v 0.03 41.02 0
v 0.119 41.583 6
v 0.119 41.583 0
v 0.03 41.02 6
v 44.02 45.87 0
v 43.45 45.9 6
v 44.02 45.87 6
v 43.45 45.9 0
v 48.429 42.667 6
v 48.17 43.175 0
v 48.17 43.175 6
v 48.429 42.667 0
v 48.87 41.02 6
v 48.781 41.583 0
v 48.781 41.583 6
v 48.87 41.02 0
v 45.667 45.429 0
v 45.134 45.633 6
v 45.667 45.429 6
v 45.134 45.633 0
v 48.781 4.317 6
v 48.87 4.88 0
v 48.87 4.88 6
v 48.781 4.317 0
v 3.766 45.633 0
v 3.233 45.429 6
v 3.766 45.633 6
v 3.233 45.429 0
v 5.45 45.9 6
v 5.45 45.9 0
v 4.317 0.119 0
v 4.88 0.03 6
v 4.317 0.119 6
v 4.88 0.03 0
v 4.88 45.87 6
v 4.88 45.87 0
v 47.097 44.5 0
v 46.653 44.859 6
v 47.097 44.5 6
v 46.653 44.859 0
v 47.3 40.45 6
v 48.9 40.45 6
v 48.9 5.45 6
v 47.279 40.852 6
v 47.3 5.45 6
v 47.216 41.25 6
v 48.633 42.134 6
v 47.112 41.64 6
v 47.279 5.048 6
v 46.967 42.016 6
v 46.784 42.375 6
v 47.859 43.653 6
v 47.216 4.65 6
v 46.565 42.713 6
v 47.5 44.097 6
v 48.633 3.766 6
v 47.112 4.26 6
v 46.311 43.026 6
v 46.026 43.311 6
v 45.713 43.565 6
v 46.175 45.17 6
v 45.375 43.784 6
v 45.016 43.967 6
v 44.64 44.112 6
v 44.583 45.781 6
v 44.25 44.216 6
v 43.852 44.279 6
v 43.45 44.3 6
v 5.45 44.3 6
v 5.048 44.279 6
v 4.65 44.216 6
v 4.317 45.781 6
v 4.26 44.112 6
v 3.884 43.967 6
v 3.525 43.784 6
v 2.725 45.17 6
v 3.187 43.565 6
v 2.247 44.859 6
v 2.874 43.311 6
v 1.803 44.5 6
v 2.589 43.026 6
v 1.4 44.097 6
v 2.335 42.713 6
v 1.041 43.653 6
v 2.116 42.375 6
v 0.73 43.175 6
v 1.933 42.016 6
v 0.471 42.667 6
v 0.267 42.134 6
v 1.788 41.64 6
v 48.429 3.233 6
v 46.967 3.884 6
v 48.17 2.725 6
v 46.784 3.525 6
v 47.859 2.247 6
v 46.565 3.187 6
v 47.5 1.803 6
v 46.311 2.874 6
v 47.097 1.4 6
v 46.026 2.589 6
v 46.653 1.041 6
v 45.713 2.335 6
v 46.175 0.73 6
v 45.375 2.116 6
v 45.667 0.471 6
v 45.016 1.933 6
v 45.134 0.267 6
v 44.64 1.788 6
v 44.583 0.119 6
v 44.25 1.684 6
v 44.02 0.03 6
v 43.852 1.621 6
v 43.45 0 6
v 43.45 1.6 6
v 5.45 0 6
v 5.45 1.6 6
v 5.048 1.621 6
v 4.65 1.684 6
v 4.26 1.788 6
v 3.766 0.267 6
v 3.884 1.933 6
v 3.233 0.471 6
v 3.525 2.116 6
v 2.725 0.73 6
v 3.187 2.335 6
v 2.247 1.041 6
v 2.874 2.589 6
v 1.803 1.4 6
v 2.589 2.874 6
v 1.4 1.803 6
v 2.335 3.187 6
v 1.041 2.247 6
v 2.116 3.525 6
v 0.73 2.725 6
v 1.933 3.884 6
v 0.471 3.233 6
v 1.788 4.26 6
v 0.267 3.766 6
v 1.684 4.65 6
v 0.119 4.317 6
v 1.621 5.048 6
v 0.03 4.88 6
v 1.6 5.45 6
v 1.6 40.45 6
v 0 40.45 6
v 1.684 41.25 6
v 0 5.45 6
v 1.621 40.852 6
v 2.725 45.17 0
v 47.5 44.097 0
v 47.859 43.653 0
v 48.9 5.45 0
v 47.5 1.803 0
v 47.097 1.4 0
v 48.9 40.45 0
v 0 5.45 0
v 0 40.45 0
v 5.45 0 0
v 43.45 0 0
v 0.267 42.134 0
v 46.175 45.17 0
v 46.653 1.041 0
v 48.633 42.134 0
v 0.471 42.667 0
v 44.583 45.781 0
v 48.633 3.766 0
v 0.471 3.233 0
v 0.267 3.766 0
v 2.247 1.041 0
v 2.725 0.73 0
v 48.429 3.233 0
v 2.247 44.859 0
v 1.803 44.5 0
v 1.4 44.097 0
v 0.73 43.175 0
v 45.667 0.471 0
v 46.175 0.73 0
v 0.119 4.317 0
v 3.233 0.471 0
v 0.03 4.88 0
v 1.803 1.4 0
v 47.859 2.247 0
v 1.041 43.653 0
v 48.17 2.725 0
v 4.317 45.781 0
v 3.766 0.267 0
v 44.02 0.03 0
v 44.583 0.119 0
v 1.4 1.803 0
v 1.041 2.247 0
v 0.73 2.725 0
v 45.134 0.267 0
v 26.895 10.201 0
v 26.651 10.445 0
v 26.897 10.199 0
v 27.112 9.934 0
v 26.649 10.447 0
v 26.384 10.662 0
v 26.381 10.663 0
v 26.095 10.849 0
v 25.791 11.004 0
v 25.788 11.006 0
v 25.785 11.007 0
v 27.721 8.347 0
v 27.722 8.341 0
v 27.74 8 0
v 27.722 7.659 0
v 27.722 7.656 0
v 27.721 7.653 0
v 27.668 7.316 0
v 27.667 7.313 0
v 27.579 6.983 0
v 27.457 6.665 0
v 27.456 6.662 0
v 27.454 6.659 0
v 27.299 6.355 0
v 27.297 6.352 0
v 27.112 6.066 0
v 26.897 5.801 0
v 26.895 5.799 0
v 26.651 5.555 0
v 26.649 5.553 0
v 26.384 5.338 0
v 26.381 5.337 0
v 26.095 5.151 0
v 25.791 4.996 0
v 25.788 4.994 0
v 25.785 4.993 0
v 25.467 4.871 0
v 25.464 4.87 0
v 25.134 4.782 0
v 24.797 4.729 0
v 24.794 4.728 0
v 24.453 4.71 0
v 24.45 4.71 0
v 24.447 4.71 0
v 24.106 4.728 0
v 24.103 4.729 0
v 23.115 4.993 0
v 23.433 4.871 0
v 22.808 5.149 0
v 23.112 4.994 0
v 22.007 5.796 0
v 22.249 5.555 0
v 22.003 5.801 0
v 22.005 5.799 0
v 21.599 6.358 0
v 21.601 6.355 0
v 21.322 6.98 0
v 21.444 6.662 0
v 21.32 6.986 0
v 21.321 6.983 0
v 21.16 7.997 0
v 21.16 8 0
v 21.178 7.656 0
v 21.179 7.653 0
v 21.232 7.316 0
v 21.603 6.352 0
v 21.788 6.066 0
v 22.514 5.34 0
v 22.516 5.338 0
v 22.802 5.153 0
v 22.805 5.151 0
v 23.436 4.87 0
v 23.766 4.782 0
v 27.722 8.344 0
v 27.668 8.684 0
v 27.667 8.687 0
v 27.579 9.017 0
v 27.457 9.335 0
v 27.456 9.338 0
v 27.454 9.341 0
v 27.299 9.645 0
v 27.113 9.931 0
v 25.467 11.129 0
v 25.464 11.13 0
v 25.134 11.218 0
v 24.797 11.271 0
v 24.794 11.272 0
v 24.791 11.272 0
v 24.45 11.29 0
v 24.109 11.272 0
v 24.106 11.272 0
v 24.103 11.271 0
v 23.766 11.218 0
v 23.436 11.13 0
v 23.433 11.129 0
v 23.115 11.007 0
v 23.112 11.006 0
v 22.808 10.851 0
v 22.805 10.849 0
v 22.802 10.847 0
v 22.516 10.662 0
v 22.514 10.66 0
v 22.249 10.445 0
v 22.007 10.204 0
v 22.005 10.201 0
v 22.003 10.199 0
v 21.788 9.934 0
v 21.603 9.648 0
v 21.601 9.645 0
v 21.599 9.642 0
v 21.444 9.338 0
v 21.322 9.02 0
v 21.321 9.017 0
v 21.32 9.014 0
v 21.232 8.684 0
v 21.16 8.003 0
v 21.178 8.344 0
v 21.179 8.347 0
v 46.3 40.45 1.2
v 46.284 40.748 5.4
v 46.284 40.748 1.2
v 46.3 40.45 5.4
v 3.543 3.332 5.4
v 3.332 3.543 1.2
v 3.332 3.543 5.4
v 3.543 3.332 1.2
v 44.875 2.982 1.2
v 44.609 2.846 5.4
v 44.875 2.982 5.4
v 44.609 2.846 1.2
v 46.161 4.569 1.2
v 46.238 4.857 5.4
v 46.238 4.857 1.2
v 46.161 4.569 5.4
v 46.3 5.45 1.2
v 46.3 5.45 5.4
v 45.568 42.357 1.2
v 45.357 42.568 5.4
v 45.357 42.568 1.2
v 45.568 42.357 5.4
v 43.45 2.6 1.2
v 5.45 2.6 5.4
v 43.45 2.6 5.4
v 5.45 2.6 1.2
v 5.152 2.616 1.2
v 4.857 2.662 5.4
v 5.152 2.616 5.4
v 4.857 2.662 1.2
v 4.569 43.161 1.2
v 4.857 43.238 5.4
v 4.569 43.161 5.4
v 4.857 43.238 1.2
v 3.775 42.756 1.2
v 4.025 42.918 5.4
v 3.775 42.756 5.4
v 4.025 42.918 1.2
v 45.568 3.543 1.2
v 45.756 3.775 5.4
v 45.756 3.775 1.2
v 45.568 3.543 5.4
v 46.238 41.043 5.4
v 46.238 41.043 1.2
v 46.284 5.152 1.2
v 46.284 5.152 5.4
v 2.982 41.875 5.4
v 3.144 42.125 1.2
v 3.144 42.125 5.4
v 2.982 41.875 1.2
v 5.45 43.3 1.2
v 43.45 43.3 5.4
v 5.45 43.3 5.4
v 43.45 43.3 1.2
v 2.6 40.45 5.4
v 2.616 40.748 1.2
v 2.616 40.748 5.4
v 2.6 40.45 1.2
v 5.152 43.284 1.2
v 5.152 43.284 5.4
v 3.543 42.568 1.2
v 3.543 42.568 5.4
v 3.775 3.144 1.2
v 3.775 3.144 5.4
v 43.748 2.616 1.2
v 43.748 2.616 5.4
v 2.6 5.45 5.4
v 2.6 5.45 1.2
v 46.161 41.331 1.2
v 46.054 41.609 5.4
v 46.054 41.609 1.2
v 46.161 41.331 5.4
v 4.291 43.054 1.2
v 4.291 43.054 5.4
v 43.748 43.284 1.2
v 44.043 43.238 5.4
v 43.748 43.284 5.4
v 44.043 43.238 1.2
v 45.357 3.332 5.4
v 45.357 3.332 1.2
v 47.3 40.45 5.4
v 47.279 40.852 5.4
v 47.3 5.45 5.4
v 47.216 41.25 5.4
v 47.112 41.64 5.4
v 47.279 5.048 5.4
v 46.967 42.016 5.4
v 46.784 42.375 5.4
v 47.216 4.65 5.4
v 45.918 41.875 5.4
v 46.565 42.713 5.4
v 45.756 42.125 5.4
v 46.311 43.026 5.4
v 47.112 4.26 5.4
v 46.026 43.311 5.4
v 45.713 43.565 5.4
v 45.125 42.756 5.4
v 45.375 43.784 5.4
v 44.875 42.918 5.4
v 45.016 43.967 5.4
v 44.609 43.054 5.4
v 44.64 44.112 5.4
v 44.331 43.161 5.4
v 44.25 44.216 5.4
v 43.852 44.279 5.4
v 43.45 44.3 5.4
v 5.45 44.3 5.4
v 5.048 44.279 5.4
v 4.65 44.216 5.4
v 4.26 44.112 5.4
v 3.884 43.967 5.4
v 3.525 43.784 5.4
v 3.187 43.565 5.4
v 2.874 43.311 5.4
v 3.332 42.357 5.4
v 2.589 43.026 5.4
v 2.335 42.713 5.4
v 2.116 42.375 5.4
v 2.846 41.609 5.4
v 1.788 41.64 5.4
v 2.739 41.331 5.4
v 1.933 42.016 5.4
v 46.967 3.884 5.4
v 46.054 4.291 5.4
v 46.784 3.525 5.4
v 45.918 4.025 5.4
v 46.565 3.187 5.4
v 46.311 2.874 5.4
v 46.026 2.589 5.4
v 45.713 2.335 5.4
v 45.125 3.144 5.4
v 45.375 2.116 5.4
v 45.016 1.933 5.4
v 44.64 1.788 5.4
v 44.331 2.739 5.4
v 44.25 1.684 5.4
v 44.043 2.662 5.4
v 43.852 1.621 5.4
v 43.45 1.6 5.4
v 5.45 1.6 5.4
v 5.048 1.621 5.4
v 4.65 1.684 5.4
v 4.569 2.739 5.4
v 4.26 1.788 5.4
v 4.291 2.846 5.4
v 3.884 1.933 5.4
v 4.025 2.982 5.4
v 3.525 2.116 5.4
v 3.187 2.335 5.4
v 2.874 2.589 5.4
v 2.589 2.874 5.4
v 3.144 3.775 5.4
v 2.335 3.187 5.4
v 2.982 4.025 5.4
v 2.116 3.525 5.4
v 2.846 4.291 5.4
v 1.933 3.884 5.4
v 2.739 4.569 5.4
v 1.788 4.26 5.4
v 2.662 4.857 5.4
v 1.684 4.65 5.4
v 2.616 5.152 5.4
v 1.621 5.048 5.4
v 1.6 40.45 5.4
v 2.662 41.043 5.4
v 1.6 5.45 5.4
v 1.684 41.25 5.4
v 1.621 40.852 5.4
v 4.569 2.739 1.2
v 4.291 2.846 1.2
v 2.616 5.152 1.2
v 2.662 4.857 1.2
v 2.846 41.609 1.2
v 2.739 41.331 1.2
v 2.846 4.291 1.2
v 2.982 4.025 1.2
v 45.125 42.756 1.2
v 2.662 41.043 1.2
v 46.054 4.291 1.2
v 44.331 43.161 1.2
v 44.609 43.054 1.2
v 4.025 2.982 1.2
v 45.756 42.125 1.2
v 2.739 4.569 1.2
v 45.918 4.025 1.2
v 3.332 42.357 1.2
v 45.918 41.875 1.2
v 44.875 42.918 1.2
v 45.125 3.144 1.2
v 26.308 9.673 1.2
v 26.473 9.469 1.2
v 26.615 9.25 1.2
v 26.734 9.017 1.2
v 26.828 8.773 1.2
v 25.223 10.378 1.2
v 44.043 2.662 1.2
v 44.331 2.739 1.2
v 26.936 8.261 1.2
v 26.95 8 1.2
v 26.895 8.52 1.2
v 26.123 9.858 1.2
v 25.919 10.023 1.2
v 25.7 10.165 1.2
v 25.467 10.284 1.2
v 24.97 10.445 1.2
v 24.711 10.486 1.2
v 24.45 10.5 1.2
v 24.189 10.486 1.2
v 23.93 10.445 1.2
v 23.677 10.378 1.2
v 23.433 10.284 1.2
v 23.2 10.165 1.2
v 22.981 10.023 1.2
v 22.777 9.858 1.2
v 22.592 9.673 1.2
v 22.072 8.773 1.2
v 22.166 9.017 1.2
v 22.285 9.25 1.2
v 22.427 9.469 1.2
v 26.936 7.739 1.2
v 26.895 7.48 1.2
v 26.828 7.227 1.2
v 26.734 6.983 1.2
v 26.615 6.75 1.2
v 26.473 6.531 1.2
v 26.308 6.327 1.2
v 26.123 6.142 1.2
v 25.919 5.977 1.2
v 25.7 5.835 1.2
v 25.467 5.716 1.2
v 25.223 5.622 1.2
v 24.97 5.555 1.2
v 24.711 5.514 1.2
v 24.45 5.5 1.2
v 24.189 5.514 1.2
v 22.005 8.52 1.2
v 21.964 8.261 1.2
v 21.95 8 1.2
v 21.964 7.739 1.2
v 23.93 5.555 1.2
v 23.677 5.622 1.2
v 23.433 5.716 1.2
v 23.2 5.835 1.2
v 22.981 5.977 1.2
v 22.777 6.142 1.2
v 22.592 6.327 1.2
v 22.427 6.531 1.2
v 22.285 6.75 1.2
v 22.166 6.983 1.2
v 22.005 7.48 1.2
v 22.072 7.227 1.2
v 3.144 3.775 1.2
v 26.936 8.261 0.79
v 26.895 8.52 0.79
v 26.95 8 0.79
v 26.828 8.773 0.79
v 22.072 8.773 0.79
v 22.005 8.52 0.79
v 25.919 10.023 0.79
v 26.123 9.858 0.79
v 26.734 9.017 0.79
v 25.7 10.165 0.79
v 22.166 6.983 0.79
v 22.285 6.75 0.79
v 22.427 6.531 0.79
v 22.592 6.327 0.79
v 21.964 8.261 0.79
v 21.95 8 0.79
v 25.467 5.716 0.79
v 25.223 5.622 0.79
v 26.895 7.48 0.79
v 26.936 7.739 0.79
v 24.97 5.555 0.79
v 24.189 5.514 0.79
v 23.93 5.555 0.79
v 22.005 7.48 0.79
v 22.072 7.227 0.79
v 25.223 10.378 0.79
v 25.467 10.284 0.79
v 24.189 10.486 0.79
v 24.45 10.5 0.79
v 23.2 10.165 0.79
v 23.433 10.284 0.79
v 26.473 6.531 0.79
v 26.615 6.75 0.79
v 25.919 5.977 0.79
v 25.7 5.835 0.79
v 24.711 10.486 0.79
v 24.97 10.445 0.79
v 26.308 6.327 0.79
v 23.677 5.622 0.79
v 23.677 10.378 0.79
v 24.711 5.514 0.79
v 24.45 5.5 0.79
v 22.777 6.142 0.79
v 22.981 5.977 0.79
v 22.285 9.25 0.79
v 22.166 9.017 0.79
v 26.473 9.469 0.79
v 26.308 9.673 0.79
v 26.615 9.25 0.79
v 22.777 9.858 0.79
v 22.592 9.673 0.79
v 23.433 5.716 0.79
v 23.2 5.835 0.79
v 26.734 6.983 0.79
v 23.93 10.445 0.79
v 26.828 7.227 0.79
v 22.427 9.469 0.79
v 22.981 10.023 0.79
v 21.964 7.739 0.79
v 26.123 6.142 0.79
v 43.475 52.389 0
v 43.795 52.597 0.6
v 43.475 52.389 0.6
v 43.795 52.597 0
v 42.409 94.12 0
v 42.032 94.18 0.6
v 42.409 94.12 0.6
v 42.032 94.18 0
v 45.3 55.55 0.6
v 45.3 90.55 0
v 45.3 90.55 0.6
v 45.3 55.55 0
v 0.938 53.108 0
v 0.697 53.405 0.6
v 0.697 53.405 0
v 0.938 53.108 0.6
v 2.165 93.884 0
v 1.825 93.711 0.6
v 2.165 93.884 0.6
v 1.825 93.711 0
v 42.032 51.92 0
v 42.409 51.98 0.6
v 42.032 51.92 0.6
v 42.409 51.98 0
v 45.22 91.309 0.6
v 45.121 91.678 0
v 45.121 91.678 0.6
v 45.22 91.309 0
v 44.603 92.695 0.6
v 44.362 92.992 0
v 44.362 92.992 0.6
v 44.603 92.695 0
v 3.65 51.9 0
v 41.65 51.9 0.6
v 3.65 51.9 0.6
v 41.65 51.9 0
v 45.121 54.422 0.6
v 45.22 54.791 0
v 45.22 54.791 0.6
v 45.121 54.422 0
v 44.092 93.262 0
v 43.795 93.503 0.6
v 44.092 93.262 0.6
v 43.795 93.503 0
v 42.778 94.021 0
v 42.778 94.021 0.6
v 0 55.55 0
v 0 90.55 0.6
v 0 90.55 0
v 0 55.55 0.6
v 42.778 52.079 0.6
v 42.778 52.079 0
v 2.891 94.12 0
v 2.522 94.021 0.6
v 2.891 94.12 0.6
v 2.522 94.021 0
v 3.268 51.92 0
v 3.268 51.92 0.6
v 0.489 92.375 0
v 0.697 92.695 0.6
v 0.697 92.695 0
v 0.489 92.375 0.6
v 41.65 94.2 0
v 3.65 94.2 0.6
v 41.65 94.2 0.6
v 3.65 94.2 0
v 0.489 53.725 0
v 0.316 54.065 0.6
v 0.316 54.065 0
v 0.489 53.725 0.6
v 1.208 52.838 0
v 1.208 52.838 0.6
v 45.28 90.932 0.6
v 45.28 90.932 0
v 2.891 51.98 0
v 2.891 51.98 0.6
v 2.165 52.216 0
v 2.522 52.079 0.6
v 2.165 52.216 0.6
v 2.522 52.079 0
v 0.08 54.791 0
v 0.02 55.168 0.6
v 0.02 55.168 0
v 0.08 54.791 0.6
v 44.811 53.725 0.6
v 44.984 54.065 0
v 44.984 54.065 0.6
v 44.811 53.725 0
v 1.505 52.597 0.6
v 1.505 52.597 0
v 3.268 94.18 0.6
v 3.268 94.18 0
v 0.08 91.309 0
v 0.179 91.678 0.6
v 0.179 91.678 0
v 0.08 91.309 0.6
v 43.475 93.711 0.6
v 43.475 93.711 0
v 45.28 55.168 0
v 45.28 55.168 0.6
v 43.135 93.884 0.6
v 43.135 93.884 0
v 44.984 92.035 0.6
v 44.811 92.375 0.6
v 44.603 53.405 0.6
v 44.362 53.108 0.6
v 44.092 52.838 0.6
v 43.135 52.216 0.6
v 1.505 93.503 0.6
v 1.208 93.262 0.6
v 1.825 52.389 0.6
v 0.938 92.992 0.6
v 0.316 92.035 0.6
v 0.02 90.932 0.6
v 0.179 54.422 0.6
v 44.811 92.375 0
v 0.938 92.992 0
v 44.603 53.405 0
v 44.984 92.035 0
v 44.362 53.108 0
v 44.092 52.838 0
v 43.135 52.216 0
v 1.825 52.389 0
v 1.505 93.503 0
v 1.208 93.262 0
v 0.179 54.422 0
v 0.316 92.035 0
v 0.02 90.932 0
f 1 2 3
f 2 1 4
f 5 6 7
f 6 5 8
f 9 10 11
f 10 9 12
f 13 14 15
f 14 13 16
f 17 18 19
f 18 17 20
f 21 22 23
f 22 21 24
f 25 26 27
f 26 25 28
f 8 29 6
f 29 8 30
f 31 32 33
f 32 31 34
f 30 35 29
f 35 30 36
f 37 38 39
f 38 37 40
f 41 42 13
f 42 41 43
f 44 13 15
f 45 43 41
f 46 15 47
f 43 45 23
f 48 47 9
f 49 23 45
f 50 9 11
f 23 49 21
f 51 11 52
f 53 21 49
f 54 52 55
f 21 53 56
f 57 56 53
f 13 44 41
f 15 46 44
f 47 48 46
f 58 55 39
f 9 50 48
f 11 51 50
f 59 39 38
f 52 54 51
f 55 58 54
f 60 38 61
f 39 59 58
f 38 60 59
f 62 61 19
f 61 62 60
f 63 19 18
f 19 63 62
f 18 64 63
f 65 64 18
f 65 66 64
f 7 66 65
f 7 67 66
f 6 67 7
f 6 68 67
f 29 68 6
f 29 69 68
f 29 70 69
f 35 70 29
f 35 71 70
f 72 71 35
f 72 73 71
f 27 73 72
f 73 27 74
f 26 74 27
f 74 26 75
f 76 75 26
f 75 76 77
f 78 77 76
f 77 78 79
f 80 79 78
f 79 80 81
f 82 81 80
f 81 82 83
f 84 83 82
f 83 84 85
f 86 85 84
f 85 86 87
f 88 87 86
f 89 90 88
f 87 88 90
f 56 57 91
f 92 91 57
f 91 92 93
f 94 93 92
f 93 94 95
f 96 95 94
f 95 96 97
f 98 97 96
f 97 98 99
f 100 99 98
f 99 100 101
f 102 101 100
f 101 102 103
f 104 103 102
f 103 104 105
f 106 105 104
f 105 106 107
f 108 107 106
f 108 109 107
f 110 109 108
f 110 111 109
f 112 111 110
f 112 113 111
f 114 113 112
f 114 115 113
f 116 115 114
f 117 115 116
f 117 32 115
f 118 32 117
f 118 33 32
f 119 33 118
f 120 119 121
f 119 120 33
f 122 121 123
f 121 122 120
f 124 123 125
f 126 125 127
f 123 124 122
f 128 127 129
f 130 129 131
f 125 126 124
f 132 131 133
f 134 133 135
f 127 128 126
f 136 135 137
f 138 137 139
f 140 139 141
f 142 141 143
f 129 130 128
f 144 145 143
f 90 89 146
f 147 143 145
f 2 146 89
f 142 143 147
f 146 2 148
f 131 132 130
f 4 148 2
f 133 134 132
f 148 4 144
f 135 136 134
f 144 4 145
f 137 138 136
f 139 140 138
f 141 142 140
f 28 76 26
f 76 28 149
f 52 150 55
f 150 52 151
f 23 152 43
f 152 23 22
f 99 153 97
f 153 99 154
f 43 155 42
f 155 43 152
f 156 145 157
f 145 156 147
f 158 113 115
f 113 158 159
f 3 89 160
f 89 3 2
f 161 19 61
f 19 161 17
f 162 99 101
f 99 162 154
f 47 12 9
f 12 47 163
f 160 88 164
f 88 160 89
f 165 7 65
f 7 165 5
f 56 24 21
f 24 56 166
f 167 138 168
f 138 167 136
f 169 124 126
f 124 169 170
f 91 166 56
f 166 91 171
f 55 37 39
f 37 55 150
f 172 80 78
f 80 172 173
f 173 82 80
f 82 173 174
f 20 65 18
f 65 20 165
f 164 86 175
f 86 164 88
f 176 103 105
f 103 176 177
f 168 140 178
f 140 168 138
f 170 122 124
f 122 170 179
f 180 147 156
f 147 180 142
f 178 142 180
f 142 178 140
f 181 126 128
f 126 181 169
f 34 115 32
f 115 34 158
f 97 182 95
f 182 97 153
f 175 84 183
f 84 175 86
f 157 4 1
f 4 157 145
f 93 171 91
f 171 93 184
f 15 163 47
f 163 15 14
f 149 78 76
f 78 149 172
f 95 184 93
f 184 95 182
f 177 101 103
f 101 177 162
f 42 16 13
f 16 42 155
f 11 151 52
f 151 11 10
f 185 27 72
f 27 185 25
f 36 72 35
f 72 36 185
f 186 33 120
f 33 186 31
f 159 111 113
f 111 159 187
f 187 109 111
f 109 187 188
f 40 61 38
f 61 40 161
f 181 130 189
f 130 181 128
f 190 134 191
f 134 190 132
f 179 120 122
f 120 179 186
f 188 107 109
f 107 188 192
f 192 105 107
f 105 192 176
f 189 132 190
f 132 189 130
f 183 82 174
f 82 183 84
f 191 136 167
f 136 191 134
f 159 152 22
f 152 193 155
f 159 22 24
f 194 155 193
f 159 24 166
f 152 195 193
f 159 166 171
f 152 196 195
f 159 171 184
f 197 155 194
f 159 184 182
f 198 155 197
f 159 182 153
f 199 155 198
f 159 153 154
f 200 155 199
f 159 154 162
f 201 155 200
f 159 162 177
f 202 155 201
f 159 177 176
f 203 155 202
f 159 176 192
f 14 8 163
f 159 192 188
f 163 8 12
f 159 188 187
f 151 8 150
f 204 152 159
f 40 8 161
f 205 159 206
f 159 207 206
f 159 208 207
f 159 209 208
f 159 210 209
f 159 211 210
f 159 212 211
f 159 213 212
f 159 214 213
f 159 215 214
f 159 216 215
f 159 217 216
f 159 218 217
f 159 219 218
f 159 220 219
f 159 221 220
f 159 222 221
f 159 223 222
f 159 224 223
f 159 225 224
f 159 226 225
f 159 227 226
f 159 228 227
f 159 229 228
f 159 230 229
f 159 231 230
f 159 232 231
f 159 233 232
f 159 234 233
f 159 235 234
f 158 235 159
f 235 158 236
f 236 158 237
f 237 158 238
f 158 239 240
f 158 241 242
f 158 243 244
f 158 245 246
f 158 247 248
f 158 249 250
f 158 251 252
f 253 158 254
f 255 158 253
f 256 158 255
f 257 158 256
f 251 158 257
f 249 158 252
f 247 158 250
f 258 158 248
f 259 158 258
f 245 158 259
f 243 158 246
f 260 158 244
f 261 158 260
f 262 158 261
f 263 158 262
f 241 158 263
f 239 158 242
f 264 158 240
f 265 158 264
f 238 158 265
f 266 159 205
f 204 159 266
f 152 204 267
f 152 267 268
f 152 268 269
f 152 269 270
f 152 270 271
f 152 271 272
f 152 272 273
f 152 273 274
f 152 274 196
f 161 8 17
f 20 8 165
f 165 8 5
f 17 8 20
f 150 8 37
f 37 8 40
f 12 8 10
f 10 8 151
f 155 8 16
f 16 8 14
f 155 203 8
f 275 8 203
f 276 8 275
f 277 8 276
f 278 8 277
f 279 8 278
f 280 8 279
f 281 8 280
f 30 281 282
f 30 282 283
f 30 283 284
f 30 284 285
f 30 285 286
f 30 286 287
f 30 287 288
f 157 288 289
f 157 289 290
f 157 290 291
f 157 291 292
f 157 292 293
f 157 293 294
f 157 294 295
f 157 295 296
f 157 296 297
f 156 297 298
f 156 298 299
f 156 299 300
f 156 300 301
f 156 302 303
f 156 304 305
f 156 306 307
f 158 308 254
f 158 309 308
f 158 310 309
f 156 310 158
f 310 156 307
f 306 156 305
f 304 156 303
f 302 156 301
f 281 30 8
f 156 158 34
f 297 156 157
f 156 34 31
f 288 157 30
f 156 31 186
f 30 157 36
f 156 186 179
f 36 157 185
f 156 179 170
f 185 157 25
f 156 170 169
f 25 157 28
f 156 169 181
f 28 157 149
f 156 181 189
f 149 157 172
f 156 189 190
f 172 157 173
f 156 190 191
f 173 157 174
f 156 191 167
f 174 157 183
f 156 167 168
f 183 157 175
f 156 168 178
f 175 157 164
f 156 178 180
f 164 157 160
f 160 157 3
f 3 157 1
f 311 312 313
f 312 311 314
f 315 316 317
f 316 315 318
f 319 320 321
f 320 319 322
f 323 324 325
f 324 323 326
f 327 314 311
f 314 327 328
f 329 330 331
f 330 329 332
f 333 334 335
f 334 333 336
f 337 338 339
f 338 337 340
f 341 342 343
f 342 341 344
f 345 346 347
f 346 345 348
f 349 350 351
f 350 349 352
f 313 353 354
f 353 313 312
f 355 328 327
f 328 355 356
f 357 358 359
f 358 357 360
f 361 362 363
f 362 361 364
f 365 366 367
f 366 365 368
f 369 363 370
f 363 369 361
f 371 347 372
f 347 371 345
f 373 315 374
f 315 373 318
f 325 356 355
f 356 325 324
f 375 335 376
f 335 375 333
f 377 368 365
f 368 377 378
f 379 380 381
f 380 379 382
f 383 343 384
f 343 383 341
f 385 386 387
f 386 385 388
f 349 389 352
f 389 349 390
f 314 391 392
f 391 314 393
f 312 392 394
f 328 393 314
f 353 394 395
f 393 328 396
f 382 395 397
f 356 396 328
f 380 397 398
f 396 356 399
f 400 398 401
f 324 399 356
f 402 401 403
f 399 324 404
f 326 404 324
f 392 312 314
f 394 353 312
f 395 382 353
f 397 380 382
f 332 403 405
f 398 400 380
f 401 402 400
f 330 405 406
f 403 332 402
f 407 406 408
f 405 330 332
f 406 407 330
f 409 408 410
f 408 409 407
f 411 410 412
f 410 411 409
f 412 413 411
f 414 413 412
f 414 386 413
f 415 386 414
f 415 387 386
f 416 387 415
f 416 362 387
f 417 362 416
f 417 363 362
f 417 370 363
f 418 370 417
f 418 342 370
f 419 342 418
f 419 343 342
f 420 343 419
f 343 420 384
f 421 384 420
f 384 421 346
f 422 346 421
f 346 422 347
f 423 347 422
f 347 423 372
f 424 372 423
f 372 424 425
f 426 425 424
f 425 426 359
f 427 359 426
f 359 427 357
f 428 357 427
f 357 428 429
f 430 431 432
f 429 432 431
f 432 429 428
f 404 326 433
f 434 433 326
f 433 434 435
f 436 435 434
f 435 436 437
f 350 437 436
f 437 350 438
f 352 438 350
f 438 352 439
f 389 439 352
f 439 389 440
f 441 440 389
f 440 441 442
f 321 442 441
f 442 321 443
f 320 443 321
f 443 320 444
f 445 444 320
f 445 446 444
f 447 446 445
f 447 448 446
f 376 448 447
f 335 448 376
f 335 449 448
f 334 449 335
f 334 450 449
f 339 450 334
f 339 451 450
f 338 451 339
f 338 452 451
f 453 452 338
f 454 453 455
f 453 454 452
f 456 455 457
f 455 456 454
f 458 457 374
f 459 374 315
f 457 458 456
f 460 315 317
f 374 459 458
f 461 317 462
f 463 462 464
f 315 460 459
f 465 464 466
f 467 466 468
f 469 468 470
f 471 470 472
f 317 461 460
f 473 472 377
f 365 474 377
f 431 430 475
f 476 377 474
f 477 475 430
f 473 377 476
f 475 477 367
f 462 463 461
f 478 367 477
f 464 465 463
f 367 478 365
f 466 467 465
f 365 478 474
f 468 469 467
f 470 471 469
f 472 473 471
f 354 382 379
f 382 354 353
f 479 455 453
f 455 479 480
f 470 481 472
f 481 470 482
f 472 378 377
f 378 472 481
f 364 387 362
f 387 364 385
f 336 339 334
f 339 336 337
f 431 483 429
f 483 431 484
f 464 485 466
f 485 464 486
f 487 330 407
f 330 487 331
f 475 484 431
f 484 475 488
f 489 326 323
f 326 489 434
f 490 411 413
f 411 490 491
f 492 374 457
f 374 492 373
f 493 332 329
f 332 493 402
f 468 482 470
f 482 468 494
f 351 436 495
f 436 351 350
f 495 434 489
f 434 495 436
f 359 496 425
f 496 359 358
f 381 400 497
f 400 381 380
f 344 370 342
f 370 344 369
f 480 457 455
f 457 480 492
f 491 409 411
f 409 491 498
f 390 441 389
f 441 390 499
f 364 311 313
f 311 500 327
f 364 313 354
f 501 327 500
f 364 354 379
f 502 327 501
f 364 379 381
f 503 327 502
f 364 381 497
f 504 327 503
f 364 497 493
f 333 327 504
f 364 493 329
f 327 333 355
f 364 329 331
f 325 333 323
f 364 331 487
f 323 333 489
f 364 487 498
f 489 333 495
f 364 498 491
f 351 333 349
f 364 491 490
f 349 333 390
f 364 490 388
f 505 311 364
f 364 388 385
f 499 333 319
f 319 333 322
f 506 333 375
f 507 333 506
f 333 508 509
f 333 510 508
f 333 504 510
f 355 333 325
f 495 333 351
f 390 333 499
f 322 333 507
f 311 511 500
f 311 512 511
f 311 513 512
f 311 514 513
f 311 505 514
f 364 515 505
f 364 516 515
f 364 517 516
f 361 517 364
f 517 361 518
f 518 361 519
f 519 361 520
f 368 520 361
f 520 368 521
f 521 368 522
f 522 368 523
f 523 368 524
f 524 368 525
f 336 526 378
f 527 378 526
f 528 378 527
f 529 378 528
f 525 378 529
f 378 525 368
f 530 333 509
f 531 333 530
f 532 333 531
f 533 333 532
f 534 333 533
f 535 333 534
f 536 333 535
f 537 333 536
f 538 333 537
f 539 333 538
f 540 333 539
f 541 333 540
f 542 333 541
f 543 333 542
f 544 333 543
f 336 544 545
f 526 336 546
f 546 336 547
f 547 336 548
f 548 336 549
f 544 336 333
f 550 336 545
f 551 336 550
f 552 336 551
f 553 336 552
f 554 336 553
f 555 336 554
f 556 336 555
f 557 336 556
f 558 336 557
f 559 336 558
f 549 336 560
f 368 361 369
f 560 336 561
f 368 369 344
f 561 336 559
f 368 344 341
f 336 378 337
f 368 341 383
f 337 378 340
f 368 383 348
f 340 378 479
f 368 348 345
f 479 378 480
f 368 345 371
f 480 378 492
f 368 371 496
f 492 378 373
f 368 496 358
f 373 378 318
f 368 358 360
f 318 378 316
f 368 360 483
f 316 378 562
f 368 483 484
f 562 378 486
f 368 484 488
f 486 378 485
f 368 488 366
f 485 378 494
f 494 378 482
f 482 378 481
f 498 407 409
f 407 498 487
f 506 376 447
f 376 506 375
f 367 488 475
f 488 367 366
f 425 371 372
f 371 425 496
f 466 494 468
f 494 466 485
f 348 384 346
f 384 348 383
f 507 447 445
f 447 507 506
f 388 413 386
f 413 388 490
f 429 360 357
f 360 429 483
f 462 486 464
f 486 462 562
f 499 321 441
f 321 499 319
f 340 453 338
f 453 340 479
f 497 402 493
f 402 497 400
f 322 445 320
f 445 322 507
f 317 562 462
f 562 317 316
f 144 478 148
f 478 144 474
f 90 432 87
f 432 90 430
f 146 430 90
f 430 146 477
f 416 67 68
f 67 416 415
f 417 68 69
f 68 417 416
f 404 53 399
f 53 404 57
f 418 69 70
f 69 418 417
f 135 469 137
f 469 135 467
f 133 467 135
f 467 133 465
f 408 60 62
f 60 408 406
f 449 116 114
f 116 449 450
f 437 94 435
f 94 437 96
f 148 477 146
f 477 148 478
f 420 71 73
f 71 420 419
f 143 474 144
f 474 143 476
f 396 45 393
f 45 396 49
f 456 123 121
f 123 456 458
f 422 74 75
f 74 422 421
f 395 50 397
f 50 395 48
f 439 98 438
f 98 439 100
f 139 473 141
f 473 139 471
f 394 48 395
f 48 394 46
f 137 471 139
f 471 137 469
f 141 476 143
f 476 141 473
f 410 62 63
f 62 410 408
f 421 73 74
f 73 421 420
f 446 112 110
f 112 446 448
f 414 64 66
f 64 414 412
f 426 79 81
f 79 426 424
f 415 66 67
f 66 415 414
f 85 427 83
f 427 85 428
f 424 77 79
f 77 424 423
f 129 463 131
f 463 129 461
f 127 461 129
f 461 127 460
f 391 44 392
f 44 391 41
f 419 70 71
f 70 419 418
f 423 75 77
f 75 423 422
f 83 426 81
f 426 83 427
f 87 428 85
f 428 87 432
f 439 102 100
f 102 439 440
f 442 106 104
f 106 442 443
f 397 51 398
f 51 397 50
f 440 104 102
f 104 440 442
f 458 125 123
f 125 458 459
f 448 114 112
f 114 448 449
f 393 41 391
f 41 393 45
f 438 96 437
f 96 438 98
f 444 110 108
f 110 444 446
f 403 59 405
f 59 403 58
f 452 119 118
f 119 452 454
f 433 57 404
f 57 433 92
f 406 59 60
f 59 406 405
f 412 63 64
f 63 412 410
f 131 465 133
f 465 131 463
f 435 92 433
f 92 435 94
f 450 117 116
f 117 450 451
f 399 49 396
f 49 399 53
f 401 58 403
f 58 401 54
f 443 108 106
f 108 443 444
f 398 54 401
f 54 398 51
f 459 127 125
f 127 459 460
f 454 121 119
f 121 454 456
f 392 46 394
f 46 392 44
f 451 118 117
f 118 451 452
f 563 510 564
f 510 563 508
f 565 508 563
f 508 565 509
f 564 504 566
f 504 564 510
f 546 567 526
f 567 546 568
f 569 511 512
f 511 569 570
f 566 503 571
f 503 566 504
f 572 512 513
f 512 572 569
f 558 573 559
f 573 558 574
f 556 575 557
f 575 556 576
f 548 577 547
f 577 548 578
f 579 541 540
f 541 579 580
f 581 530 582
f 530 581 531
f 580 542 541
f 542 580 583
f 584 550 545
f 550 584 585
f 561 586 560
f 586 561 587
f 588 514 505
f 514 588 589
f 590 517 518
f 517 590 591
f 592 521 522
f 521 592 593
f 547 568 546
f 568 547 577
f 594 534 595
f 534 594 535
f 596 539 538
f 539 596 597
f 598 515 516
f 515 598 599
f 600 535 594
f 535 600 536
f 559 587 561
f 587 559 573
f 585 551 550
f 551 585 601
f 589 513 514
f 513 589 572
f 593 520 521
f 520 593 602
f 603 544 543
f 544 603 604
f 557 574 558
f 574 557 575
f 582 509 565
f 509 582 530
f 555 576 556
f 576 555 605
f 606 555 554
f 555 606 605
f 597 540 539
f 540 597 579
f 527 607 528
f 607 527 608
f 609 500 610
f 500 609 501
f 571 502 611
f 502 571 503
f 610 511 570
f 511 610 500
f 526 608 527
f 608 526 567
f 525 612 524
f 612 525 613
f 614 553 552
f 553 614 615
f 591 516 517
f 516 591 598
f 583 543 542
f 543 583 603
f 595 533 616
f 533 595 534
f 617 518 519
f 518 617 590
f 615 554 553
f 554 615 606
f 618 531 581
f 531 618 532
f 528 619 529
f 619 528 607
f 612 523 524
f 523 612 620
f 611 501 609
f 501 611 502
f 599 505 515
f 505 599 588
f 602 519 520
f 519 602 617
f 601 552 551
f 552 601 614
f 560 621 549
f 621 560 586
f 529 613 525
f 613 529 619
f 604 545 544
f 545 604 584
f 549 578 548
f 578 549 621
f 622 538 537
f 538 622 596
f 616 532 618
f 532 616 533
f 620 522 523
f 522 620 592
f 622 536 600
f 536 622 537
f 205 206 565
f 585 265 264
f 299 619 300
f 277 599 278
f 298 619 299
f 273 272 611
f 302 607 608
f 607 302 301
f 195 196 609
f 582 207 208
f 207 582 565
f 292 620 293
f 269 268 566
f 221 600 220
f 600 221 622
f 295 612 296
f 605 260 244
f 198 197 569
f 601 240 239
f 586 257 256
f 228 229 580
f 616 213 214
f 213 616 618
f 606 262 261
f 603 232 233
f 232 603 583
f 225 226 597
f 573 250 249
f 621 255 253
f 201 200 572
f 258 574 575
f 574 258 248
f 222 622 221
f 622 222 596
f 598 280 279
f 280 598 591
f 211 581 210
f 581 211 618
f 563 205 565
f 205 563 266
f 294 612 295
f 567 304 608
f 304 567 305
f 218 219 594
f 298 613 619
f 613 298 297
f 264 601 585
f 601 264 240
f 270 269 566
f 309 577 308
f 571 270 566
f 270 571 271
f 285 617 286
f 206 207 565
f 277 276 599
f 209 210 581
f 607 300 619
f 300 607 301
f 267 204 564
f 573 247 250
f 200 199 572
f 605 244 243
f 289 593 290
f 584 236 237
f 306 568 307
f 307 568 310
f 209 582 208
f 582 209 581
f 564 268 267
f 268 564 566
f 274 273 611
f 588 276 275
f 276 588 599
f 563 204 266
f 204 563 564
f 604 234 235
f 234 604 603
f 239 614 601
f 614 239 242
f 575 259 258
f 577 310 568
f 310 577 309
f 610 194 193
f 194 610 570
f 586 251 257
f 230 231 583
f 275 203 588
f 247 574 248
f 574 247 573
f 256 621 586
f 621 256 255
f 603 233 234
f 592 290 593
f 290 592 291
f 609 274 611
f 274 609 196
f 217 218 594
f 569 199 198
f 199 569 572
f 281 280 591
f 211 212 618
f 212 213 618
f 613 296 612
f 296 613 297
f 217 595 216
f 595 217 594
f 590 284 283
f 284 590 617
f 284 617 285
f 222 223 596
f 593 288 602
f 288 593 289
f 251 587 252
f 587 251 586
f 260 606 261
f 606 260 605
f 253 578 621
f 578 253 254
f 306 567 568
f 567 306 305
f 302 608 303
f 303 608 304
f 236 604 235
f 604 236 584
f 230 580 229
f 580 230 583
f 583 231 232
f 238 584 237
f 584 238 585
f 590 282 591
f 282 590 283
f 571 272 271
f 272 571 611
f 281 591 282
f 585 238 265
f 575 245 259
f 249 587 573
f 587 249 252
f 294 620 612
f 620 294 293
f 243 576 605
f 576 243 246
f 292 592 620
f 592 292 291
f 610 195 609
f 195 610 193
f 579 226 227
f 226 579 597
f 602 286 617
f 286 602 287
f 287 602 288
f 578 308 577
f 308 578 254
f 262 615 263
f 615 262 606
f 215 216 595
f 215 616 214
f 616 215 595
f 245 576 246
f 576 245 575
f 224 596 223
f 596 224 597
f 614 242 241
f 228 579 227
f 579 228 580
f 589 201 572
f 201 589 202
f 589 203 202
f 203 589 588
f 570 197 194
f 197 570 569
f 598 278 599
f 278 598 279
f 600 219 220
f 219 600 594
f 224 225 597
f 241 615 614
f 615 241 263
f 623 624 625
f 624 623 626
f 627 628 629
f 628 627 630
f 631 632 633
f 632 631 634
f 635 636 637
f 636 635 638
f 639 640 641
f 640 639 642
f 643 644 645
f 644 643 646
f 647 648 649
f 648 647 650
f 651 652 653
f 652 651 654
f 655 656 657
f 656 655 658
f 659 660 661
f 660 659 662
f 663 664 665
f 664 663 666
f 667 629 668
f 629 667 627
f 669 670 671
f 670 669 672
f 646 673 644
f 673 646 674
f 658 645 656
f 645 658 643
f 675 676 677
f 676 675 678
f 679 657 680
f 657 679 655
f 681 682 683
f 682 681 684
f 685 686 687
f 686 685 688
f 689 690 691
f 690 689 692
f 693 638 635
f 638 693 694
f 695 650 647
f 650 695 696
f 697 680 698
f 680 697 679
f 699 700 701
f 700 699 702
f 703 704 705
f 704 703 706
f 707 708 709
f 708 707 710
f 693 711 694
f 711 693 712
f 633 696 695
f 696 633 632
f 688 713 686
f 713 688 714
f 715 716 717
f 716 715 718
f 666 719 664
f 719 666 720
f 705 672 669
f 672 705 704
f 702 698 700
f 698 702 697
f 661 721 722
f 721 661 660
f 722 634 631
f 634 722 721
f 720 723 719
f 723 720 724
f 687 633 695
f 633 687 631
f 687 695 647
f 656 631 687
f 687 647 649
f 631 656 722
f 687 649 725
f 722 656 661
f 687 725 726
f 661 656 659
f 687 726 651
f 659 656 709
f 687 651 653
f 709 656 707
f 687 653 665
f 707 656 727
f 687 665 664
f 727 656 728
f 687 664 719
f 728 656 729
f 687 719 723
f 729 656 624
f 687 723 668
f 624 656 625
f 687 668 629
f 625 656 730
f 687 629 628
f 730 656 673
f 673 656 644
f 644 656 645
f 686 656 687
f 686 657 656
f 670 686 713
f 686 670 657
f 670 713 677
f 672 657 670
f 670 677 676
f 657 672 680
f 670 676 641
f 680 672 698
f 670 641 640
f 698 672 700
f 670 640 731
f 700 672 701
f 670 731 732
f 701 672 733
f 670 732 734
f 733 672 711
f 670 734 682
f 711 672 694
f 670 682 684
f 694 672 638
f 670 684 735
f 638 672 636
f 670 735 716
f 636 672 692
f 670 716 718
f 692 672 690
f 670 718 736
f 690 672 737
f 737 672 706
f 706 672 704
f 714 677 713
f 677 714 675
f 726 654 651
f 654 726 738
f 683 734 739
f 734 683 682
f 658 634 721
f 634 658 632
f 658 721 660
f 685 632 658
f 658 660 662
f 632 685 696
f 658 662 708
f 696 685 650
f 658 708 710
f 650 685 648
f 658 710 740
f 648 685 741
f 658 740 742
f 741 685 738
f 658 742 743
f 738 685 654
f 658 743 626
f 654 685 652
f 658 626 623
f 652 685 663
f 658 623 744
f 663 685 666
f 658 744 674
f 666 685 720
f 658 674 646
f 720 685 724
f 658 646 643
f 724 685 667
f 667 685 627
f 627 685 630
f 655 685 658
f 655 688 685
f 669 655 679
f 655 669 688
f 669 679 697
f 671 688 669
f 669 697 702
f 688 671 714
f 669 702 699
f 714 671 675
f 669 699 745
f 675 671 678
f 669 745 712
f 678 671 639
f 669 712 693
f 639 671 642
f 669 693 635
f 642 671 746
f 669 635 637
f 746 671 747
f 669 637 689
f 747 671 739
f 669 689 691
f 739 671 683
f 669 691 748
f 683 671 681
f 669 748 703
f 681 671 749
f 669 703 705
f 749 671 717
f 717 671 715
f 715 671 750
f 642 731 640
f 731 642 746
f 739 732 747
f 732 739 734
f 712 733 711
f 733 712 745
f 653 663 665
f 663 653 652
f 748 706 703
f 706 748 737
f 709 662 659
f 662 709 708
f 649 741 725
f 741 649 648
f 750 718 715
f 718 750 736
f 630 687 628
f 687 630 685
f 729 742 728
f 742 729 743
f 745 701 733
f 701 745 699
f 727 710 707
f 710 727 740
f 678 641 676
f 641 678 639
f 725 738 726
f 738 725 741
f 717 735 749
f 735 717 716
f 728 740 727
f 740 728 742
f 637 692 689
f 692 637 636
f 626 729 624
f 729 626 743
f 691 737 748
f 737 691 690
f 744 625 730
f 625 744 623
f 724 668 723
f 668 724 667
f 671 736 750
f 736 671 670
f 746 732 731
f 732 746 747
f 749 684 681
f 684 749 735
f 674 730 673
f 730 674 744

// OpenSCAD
// Suporte avulso para trackpad Azoteq TPS43
// -----------------------------------------------------------------------------
// Cotas do datasheet oficial "ProxSense Standard Trackpad Module" v1.02:
//   - TPS43: 43,0 x 40,0 mm, chip IQS572
//   - PCB: FR4, espessura final 1,0 mm +/- 10%
//   - Adesivo de fabrica: 3M 468 200MP, 0,13 mm, na FACE SENSIVEL
//   - Overlay compativel: 0,2 a 1,2 mm (acima disso exige firmware especial)
//
// MONTAGEM (a ordem importa):
//   1. Puxe o liner de papel pela aba.
//   2. Cole a face sensivel do pad na parte DE BAIXO da tampa (`lid`).
//      A tampa E o overlay — e nela que seu dedo toca, nao no pad.
//   3. Encaixe o conjunto tampa+pad na caixa, cabo saindo pelo rasgo lateral.
//   4. A tampa assenta num rebaixo de `lid_ledge` mm, ficando rente ao topo.
//
// `lid_t` tem que ficar entre 0,2 e 1,2 mm. O padrao de 0,6 mm da boa margem e
// imprime bem em bico de 0,4 mm. NADA CONDUTIVO nessa camada — sem tinta
// metalica, sem fita de aluminio, sem chapa encostando na face sensivel.
//
// Corte em Z, de baixo para cima:
//   0            .. base_t              piso solido
//   base_t       .. box_h - lid_t       cavidade: pad + folga para o cabo FPC
//   box_h-lid_t  .. box_h               rebaixo onde a tampa assenta
// -----------------------------------------------------------------------------

$fn = 60;

/* [Trackpad] */
tp_w   = 43.0;   // largura do modulo
tp_d   = 40.0;   // profundidade do modulo
tp_pcb = 1.0;    // espessura do PCB
tp_adh = 0.13;   // adesivo de fabrica
tp_r   = 2.5;    // raio dos cantos

/* [Corpo] */
box_h     = 6.0; // altura total. Da corpo a peca e espaco para o cabo
wall_t    = 1.6; // parede lateral
base_t    = 1.2; // piso
lid_t     = 0.6; // tampa = overlay. MANTENHA entre 0.2 e 1.2
lid_ledge = 1.0; // largura do ressalto onde a tampa apoia

/* [Impressao] */
tol     = 0.35;  // folga por lado; aumente se ficar apertado
lid_gap = 0.20;  // folga extra so da tampa, para ela entrar sem forcar

/* [Saida dos fios] */
// Saida pelo FUNDO, nao pela lateral: a montagem usa fios soltos
// (SDA, SCL, 3V3, GND), nao o cabo flat.
wire_d    = 5.0;  // diametro do furo de passagem
wire_x    = 0.5;  // posicao no eixo X, como fracao da largura (0..1)
wire_edge = 8.0;  // distancia do centro do furo ate a borda Y mais proxima

/* [Fixacao — OPCIONAL, NAO VERIFICADO] */
// Furos com a cota da tampa ACRILICA do OLED da Kea Workshop
// (Ø2,82 mm, 18,43 mm entre centros), extraidas do SVG oficial.
// ATENCAO: NAO foi confirmado que a tampa "No Display" usa a mesma
// interface — ela e uma casca 3D bem maior. Meca a sua antes de usar.
mount_holes = false;
mount_d     = 2.82;
mount_pitch = 18.43;

/* [Render] */
part = "both";   // "box", "lid" ou "both"

// -----------------------------------------------------------------------------

pocket_w = tp_w + 2*tol;          // cavidade que abriga o pad
pocket_d = tp_d + 2*tol;
pocket_r = tp_r + tol;

recess_w = pocket_w + 2*lid_ledge; // rebaixo da tampa, maior que a cavidade
recess_d = pocket_d + 2*lid_ledge; // — a diferenca forma o ressalto de apoio
recess_r = pocket_r + lid_ledge;

box_w = recess_w + 2*wall_t;
box_d = recess_d + 2*wall_t;
box_r = recess_r + wall_t;

cavity_h = box_h - lid_t - base_t; // espaco util interno

module rounded_cube(x, y, z, r) {
    hull() for (dx = [r, x-r], dy = [r, y-r])
        translate([dx, dy, 0]) cylinder(r = r, h = z);
}

module box() {
    assert(cavity_h >= tp_pcb + tp_adh,
           "cavidade menor que o pad: aumente box_h");
    assert(lid_t >= 0.2 && lid_t <= 1.2,
           "lid_t fora da faixa de overlay do datasheet (0,2 a 1,2 mm)");

    difference() {
        rounded_cube(box_w, box_d, box_h, box_r);

        // cavidade interna: abriga o pad e sobra folga para o cabo
        translate([wall_t + lid_ledge, wall_t + lid_ledge, base_t])
            rounded_cube(pocket_w, pocket_d, cavity_h, pocket_r);

        // rebaixo da tampa, aberto no topo
        translate([wall_t, wall_t, box_h - lid_t])
            rounded_cube(recess_w, recess_d, lid_t + 0.1, recess_r);

        // passagem dos fios pelo FUNDO
        translate([box_w * wire_x, wire_edge, -0.1])
            cylinder(d = wire_d, h = base_t + 0.2);

        // chanfro na saida, para os fios nao dobrarem em quina viva
        translate([box_w * wire_x, wire_edge, -0.01])
            cylinder(d1 = wire_d + 1.6, d2 = wire_d, h = 0.8);

        // furos de fixacao, se habilitados
        if (mount_holes)
            for (dx = [-mount_pitch/2, mount_pitch/2])
                translate([box_w/2 + dx, box_d - wire_edge, -0.1])
                    cylinder(d = mount_d, h = base_t + 0.2);
    }
}

// Tampa: e o overlay. Imprima com a face lisa para cima, sem suporte.
module lid() {
    rounded_cube(recess_w - 2*lid_gap, recess_d - 2*lid_gap, lid_t,
                 recess_r - lid_gap);
}

if (part == "box" || part == "both") box();
if (part == "lid" || part == "both") translate([0, box_d + 6, 0]) lid();
